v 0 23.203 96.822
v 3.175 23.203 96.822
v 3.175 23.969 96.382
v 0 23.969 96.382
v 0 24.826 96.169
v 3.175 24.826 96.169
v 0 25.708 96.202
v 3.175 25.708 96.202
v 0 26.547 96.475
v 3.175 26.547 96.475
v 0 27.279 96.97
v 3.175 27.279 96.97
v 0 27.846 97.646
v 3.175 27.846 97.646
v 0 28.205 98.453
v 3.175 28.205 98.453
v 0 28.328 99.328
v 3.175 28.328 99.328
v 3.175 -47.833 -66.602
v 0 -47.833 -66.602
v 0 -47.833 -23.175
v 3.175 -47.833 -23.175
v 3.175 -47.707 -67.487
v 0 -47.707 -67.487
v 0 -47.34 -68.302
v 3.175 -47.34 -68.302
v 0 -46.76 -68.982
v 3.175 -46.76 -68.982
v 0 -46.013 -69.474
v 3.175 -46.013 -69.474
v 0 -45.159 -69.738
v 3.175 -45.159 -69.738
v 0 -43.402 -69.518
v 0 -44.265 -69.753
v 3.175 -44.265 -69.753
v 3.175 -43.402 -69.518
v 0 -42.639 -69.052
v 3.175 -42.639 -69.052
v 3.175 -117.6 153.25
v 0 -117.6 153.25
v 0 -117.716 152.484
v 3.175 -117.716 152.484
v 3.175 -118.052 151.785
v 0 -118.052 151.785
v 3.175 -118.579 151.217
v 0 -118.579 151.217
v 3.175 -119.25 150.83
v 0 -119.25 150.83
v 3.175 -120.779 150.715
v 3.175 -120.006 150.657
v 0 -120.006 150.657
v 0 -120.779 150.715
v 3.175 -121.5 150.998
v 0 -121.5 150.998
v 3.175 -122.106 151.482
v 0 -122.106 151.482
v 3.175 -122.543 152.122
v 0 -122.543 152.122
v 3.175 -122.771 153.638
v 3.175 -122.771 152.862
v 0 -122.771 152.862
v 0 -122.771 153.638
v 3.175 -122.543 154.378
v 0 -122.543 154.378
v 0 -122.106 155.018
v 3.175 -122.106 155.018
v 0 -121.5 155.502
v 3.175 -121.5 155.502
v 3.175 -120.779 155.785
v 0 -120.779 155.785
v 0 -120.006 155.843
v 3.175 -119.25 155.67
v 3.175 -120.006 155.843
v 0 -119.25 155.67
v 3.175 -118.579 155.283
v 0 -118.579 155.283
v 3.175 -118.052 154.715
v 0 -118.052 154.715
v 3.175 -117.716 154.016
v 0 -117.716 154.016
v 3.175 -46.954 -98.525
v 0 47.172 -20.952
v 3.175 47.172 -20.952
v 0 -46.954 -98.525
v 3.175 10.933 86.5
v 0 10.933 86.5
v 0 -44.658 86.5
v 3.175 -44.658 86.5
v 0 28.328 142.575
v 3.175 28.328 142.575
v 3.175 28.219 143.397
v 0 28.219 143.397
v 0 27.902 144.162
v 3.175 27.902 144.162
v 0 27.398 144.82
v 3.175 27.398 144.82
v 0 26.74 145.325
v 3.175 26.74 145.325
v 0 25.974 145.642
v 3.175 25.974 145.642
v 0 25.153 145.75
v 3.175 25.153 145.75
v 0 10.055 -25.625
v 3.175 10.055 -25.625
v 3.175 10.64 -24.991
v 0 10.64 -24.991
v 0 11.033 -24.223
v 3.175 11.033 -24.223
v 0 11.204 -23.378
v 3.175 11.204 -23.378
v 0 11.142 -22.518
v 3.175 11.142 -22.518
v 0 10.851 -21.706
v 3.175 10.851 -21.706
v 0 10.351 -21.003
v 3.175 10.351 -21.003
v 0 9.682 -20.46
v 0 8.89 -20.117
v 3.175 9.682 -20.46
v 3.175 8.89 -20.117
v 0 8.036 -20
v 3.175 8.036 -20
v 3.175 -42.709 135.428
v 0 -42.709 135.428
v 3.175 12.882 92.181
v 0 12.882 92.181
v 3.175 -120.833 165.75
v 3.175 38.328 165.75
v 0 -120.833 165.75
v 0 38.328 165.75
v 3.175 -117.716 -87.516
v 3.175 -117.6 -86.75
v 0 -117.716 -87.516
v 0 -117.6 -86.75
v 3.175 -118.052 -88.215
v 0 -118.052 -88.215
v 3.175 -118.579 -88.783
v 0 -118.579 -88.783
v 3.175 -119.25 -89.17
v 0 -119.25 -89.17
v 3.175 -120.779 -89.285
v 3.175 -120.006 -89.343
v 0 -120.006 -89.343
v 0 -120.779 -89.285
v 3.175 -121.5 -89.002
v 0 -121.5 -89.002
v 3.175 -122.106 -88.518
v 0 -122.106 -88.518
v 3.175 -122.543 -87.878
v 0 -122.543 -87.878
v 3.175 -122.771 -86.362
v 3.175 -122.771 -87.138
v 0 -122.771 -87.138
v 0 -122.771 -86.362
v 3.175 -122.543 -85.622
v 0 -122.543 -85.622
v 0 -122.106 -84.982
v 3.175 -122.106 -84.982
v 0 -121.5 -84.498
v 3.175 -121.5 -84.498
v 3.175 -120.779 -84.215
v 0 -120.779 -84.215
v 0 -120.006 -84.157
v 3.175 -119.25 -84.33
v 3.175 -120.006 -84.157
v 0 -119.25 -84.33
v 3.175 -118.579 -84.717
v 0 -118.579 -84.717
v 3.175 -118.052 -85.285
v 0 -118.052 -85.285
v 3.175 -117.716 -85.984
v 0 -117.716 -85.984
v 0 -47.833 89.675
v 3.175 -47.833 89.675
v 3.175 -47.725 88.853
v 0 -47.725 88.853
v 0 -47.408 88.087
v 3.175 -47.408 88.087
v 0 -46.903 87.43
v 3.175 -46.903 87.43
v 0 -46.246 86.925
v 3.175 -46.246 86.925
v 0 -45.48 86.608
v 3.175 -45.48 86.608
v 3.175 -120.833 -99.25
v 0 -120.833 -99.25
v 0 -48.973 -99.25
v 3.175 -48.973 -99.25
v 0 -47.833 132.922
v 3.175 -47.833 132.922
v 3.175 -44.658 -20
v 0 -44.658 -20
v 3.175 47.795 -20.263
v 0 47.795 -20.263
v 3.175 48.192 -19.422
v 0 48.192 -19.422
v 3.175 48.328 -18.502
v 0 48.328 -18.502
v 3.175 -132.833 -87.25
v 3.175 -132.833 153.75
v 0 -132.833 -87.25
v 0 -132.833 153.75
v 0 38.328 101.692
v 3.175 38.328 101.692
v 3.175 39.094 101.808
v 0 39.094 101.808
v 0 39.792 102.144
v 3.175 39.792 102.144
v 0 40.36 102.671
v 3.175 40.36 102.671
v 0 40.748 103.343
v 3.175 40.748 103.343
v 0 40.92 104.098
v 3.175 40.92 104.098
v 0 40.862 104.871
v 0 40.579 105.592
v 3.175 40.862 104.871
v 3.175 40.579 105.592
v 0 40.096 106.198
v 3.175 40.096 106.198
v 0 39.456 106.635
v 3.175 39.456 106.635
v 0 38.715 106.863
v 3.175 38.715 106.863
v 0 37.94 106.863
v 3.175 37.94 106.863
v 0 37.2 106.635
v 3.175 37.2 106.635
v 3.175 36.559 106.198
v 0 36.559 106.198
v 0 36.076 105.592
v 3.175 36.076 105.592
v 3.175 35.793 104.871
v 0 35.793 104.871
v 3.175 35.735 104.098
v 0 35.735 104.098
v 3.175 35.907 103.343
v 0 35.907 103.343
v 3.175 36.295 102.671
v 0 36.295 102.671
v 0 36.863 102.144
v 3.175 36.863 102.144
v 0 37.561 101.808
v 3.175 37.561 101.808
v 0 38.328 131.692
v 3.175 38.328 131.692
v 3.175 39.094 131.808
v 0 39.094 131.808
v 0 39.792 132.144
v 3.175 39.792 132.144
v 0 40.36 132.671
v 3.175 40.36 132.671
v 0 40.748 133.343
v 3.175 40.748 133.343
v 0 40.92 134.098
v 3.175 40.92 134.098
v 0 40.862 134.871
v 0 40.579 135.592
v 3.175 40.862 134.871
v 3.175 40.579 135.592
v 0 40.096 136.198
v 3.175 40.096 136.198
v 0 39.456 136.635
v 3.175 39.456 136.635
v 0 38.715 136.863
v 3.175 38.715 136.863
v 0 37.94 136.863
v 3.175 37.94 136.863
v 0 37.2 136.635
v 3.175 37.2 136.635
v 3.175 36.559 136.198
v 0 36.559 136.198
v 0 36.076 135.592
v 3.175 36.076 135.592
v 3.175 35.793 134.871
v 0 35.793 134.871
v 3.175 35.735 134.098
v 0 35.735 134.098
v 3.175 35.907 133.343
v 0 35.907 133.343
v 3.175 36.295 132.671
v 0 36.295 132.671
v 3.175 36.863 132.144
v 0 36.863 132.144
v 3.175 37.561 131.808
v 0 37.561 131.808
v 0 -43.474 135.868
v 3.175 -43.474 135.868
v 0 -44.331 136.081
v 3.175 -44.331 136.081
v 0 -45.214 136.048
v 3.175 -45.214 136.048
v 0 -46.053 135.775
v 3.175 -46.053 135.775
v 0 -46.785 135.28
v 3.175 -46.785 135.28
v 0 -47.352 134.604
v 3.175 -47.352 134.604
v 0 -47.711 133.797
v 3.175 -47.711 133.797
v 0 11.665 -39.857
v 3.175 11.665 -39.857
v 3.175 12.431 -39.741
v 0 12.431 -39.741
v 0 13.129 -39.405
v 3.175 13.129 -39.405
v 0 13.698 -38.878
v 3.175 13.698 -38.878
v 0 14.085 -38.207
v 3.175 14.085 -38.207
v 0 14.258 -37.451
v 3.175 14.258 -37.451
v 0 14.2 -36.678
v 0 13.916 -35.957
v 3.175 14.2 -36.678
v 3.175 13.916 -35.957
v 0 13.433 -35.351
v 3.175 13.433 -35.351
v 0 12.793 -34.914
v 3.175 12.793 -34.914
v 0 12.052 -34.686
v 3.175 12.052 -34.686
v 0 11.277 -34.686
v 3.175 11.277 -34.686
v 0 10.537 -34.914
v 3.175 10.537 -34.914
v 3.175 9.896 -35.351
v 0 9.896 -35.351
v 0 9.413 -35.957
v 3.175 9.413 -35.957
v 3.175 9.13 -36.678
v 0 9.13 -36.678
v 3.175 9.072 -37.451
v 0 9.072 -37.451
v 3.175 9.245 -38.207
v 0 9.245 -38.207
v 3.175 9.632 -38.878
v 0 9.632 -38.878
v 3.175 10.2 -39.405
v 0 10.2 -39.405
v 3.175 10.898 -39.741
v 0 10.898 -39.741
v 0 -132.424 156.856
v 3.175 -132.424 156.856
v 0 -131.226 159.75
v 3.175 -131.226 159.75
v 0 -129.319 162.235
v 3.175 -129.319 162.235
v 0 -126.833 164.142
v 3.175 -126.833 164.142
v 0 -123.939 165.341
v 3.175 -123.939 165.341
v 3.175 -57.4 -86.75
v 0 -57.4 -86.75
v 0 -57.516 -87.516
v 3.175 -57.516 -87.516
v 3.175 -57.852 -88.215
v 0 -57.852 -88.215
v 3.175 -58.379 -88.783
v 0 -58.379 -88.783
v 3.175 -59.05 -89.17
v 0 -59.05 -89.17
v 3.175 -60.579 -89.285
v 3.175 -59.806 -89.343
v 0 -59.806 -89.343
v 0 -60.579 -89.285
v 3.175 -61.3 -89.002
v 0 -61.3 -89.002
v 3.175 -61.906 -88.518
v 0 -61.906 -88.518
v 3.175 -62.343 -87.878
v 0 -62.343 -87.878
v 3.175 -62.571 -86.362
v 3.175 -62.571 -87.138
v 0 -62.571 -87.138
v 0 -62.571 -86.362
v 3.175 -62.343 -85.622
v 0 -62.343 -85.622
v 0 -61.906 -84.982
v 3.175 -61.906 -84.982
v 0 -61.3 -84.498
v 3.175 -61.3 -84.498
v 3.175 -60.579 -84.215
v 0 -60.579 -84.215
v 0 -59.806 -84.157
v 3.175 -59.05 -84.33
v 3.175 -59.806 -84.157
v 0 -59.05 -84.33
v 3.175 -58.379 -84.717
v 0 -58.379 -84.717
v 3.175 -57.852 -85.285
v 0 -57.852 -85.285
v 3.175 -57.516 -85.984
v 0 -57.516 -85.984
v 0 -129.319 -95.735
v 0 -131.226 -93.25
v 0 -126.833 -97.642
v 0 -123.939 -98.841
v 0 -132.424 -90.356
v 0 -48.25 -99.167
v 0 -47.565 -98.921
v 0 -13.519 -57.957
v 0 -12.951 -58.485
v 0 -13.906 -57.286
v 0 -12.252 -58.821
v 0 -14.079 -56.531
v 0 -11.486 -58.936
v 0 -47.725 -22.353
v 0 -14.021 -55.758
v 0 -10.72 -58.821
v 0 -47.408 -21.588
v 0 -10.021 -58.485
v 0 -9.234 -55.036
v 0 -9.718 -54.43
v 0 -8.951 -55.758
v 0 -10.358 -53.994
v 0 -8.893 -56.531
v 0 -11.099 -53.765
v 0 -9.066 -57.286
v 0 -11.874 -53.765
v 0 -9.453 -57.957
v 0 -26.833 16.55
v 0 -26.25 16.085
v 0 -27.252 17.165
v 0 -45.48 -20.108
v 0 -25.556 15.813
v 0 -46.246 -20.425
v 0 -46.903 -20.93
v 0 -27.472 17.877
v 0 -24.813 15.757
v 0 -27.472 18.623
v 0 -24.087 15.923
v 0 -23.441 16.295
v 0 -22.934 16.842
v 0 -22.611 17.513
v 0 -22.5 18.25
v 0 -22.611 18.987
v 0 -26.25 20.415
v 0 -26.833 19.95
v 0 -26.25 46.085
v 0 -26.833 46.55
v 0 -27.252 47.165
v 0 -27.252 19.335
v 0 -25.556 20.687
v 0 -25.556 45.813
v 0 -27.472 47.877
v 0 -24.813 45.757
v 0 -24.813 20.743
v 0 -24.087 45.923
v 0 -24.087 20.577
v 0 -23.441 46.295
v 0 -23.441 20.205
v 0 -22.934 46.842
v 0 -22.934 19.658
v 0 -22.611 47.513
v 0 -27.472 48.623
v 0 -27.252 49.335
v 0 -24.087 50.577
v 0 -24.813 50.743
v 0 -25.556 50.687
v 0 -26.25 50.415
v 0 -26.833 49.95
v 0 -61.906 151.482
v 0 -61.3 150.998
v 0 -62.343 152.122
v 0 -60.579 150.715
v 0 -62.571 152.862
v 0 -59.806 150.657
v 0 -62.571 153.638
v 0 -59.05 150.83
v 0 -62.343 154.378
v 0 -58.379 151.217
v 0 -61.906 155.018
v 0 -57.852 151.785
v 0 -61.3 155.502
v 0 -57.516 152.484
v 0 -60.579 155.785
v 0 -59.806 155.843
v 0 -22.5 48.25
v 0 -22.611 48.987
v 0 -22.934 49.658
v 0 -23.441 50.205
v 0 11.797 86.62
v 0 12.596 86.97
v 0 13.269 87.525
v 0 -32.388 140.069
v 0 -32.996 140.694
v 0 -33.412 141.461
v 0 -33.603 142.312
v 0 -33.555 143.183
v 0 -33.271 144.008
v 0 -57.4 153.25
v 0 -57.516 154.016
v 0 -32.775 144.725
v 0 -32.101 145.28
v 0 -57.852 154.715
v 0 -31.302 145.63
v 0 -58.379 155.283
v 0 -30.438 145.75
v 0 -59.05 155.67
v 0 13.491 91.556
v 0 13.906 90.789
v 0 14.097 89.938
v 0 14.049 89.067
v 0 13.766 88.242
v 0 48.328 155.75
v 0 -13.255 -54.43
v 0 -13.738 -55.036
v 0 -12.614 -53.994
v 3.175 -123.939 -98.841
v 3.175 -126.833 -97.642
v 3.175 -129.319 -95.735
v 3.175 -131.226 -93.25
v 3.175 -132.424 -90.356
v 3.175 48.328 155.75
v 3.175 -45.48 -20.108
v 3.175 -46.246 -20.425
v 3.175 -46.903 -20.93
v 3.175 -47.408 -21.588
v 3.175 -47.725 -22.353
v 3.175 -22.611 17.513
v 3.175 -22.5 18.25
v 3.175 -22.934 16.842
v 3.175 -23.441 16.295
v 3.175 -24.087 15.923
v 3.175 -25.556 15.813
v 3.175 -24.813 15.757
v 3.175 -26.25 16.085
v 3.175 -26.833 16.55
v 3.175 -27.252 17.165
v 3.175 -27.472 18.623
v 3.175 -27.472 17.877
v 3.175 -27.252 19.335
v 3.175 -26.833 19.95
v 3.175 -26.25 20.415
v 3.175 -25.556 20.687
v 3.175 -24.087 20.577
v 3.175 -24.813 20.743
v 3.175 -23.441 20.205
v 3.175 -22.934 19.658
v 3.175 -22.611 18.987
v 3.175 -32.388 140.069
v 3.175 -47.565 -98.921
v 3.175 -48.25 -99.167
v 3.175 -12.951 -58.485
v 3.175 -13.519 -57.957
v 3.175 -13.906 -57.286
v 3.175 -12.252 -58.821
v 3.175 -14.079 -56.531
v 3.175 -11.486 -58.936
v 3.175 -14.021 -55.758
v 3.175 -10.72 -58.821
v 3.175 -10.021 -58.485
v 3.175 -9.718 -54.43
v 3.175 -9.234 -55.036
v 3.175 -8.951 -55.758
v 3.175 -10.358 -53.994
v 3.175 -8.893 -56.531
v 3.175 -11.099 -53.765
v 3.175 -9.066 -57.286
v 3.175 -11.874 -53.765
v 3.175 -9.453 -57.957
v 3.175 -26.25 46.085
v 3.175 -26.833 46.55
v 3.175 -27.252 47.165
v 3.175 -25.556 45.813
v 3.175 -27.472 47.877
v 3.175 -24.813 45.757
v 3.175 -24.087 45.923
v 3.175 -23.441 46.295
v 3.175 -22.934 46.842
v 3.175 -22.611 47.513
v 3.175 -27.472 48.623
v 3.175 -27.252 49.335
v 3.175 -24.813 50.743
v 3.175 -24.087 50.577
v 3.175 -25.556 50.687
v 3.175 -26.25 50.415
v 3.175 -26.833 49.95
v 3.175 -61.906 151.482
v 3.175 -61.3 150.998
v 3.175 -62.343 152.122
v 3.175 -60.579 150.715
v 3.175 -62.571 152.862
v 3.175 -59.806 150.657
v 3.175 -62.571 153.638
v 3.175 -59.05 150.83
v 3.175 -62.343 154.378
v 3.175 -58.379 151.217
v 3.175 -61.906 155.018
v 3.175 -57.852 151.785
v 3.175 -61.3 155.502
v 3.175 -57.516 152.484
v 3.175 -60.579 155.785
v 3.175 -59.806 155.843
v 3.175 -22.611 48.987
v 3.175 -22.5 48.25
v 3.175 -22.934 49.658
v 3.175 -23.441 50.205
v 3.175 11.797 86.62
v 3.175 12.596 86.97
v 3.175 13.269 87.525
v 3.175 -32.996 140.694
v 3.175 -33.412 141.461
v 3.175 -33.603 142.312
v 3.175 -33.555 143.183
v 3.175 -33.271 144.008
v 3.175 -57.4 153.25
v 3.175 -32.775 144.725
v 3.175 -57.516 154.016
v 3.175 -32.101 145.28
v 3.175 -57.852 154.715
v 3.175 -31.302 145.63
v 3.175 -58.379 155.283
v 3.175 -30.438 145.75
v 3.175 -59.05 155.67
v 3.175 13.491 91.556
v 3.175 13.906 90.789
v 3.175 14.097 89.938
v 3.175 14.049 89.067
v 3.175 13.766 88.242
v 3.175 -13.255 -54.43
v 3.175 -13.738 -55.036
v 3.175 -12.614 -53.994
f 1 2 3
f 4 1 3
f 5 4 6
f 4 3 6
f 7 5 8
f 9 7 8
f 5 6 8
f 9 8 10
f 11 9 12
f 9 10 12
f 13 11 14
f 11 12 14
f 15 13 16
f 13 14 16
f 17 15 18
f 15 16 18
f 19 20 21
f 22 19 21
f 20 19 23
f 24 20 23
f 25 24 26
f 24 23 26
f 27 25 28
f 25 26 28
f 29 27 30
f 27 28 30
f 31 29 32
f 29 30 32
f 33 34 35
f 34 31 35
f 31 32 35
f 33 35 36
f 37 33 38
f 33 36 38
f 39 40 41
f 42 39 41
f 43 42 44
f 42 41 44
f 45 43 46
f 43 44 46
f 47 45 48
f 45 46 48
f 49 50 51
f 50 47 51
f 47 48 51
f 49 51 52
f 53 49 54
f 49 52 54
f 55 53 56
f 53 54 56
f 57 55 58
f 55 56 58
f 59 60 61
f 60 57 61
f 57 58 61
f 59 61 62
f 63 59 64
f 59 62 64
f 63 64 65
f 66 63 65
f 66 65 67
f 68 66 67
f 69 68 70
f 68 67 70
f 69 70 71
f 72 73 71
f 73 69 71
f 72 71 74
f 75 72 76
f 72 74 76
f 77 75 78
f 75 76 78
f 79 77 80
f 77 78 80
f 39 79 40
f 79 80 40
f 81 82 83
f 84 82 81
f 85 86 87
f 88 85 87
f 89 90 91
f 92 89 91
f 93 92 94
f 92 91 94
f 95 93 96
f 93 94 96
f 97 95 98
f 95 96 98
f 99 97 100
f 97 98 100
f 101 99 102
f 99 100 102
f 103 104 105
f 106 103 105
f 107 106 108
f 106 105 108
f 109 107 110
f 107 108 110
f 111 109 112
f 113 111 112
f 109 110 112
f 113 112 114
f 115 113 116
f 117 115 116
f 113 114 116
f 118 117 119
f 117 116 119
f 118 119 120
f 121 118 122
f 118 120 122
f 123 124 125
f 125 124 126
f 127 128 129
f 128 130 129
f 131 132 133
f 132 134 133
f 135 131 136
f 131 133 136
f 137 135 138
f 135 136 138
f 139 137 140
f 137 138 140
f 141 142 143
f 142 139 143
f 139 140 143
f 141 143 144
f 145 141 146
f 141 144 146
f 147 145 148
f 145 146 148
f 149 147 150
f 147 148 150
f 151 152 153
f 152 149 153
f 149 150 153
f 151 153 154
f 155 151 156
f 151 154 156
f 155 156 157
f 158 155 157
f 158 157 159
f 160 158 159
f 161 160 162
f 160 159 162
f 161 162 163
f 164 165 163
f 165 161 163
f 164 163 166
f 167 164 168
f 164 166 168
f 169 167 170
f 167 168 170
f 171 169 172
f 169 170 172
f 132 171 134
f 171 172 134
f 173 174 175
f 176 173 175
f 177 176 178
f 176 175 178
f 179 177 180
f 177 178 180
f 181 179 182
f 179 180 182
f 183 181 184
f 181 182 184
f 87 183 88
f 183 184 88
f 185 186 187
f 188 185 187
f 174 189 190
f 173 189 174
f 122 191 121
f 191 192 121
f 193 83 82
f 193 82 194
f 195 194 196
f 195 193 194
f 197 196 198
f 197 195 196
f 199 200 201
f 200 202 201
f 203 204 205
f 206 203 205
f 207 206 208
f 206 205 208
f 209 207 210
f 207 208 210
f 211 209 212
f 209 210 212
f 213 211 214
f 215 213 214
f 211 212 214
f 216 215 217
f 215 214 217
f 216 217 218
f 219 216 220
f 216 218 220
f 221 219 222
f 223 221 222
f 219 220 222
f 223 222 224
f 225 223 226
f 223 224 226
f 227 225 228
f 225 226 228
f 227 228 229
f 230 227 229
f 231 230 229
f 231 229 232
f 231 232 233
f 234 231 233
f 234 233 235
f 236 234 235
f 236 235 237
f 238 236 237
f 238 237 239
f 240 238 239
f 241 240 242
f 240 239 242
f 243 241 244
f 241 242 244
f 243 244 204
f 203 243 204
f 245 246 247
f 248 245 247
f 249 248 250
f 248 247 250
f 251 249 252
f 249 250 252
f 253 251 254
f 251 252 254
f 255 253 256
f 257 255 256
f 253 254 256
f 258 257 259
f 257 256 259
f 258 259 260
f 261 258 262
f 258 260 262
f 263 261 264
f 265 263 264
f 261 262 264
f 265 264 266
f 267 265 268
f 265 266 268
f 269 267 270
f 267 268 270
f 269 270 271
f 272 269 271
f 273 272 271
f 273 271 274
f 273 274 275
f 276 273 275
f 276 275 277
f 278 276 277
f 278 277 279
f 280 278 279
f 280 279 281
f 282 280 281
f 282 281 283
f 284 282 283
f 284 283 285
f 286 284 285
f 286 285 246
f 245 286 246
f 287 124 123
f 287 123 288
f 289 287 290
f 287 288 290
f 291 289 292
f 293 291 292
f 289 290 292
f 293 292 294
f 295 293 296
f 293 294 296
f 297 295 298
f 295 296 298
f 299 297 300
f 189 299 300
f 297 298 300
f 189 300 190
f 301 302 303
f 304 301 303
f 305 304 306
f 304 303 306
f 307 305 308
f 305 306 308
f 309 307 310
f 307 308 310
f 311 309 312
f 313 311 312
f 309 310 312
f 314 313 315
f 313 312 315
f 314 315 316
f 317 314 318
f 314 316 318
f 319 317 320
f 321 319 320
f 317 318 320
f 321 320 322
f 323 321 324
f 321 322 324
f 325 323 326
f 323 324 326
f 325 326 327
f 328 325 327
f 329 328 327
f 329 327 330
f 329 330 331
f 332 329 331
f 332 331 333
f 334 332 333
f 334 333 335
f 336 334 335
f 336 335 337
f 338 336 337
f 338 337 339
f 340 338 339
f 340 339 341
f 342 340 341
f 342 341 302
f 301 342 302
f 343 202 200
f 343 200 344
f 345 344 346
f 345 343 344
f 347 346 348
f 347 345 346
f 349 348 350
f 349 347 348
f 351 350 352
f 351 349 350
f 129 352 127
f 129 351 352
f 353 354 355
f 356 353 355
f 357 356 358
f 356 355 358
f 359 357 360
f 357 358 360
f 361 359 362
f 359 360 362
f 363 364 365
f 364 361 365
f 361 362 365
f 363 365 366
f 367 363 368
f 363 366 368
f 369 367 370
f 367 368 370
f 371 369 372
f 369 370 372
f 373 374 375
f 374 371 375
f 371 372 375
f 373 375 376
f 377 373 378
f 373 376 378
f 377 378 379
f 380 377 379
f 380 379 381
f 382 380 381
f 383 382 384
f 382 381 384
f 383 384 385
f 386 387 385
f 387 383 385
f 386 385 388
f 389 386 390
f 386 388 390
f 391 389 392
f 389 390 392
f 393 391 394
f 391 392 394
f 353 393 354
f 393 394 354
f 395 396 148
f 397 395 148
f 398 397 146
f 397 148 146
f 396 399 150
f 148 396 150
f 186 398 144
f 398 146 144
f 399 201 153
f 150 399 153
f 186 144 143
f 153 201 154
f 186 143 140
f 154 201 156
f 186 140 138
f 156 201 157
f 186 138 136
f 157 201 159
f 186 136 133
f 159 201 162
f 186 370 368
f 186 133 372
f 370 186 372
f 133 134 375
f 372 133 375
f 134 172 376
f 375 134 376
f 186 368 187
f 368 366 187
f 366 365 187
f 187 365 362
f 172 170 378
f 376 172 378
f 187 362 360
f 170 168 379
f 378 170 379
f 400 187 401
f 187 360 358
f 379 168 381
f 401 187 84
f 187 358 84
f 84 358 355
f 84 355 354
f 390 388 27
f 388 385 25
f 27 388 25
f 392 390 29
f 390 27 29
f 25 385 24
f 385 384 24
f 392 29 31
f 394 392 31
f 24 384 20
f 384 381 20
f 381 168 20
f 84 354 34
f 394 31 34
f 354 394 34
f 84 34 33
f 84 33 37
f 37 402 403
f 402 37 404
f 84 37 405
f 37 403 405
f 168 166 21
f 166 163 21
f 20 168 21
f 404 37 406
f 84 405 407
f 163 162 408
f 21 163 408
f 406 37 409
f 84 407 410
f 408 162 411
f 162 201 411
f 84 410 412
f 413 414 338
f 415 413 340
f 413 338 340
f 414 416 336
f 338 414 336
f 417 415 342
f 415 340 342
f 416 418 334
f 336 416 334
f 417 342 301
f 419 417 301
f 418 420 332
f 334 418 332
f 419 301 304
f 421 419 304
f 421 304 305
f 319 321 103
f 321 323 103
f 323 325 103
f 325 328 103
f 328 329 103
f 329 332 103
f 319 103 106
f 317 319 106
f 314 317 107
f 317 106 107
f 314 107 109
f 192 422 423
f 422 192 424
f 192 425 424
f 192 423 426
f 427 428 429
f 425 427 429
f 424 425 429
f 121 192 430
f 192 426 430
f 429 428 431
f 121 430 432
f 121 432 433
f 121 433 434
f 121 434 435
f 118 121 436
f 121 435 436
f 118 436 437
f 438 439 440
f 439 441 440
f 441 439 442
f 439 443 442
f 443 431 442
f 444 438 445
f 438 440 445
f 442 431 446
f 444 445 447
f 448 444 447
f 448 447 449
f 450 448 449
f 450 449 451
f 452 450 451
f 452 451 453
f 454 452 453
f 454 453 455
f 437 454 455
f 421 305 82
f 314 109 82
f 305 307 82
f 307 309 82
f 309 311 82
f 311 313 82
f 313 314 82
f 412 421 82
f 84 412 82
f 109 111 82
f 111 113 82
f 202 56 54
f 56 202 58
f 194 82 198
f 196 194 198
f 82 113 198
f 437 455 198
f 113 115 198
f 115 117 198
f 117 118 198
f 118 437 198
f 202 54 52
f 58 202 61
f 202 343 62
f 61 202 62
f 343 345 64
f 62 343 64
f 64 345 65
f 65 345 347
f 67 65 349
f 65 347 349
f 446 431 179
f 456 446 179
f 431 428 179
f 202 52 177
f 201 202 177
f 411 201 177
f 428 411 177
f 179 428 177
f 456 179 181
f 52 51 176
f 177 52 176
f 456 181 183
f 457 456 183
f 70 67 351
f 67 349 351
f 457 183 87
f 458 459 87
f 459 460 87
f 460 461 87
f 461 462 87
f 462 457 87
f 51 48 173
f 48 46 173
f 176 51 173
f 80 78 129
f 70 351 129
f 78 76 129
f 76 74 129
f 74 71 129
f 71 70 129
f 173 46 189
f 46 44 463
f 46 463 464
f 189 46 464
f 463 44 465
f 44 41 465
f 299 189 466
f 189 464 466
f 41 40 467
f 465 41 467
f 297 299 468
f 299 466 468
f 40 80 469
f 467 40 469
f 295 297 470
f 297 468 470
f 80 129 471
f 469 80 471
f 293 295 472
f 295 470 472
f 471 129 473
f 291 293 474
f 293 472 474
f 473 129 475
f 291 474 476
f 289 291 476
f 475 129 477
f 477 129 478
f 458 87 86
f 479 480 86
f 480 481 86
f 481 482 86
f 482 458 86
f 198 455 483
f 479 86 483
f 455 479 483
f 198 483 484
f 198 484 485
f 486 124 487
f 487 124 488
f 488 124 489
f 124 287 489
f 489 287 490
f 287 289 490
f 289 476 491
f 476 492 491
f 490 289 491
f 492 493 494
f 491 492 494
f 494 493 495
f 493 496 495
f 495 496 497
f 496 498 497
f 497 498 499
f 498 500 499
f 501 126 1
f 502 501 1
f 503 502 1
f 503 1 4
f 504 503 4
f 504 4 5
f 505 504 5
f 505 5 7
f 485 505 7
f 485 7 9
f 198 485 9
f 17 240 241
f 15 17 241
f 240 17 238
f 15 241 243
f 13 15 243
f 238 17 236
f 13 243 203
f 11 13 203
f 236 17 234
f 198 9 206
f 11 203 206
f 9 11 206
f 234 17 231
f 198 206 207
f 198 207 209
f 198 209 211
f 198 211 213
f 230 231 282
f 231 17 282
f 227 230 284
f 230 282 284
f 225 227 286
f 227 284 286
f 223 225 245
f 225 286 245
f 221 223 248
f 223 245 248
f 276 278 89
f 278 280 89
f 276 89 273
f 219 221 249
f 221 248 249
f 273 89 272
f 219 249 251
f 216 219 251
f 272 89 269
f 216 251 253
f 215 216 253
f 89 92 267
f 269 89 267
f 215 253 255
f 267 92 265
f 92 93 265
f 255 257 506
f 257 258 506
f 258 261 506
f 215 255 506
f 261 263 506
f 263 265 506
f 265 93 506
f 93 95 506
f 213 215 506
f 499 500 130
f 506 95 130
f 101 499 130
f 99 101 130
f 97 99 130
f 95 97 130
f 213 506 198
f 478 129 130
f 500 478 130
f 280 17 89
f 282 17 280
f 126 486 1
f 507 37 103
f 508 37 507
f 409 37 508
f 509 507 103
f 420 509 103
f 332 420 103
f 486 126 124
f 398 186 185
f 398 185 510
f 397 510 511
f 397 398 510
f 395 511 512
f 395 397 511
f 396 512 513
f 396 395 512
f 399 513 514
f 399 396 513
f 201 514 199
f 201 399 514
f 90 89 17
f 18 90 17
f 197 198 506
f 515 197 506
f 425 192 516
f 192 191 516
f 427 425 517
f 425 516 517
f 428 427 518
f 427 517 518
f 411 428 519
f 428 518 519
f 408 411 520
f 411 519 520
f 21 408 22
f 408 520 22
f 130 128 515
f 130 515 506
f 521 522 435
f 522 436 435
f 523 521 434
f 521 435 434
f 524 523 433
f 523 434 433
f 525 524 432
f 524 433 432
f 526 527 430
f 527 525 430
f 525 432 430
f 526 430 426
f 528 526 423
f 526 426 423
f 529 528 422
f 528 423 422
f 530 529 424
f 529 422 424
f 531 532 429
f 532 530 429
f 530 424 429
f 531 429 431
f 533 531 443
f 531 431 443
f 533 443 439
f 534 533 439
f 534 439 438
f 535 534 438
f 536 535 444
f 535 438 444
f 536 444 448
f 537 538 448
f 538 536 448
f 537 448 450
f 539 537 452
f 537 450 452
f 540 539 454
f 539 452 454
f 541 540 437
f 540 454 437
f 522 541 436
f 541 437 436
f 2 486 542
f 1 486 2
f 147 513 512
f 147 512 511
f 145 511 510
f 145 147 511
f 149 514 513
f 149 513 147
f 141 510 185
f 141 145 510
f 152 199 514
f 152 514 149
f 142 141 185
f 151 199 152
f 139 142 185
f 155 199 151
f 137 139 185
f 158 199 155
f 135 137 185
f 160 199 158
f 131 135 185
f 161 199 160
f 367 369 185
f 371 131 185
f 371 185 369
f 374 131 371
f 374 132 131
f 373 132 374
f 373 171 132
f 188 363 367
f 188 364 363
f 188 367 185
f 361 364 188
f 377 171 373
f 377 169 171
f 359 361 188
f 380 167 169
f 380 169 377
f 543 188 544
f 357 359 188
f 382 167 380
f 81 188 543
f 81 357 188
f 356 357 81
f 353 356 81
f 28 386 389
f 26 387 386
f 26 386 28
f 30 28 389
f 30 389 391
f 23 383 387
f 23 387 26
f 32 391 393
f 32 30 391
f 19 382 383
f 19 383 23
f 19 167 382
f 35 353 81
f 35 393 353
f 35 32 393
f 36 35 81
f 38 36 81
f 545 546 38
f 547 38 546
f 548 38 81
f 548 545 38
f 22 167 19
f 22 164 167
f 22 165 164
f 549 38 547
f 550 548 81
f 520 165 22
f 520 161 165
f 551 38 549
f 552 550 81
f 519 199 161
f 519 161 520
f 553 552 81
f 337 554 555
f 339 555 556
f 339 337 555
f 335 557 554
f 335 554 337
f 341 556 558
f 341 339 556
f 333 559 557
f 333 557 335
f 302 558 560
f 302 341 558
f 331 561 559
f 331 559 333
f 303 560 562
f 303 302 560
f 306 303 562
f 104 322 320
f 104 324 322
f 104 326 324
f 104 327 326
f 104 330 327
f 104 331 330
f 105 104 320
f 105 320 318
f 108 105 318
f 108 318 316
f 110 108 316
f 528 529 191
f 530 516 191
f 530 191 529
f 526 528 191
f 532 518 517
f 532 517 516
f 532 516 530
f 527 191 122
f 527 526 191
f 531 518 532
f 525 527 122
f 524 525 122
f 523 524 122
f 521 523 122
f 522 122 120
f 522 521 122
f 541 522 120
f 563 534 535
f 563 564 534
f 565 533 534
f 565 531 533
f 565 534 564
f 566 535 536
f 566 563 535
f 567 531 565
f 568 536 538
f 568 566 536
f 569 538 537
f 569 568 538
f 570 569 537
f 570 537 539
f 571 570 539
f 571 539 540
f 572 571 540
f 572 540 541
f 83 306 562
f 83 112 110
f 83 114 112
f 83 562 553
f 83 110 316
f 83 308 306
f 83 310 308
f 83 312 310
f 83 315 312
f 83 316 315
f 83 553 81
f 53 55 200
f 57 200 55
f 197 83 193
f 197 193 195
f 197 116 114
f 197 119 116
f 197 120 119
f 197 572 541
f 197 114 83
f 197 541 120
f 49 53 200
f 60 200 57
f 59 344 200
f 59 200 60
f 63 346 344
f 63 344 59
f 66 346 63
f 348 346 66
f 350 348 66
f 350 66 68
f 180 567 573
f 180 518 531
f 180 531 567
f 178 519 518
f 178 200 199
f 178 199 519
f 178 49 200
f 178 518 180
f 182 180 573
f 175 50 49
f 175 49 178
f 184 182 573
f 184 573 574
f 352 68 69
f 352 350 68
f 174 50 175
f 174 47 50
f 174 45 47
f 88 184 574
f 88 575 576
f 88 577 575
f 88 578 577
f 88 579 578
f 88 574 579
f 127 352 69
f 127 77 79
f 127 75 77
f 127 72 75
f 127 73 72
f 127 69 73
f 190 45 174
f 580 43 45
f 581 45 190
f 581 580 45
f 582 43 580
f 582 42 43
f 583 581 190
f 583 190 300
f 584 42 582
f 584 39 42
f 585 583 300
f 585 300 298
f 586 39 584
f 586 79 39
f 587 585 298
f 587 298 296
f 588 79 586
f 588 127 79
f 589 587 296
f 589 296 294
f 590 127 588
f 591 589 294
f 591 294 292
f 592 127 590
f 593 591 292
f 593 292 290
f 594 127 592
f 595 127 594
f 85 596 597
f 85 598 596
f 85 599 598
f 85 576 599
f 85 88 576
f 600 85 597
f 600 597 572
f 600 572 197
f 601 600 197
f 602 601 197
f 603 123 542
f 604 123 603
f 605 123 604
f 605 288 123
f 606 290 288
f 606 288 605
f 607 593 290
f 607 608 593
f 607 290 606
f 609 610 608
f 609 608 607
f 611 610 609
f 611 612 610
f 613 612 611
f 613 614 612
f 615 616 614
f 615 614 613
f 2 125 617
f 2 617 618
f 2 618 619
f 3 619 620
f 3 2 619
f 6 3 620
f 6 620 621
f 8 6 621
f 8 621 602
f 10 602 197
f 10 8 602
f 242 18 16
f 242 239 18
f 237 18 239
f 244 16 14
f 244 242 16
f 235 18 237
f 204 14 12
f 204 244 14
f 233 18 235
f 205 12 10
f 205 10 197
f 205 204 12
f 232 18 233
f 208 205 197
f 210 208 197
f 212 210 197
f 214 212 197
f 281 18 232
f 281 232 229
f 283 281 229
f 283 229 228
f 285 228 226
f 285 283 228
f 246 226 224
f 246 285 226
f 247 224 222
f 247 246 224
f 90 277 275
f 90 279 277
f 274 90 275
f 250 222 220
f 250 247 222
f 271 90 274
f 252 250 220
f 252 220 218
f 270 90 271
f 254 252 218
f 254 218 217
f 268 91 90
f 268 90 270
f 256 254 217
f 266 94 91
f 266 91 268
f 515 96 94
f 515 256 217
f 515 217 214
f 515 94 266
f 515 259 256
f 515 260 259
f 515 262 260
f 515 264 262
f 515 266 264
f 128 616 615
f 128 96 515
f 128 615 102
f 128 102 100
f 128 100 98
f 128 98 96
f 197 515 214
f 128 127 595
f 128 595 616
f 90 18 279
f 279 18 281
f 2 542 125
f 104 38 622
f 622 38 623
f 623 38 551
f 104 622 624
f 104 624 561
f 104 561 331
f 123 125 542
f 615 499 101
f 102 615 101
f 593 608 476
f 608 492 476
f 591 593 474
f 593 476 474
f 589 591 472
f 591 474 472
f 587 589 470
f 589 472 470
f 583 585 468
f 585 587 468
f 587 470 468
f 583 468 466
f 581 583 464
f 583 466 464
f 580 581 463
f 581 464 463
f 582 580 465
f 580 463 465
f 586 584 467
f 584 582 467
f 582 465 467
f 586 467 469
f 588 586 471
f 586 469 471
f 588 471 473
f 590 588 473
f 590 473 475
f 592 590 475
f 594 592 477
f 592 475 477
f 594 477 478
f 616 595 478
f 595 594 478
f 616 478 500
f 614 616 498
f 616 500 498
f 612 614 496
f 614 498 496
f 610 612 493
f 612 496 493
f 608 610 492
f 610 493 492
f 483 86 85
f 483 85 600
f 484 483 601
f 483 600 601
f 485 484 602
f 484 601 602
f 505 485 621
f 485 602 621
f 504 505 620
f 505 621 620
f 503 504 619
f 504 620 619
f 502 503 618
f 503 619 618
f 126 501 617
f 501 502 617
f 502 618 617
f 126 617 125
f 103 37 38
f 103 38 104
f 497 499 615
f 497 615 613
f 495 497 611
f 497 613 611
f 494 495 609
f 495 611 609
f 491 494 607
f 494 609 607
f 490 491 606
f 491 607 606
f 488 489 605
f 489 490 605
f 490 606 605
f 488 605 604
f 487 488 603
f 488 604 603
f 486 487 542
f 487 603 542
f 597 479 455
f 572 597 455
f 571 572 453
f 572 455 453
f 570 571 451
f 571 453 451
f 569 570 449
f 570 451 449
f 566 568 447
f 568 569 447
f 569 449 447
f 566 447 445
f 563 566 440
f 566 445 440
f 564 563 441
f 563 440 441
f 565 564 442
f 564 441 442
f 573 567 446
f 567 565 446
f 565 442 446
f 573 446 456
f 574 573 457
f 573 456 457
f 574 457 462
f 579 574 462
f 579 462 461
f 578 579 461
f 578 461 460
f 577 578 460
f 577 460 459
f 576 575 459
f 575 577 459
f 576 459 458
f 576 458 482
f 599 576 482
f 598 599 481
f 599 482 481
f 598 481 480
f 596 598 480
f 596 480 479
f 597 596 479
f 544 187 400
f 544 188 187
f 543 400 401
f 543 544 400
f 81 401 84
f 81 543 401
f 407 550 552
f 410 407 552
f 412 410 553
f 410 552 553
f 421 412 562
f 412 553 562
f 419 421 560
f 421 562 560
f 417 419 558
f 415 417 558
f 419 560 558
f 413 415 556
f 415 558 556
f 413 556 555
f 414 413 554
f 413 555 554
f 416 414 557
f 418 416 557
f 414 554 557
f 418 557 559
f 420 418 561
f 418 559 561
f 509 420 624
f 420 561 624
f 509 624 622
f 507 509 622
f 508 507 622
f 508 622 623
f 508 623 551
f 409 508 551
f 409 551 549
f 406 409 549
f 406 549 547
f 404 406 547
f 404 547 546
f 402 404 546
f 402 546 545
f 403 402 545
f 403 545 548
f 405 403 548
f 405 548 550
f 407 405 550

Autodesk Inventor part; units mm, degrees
ref_plane "YZ Plane" through (0, 0, 0) normal (1, 0, 0) x (0, 1, 0)
ref_plane "XZ Plane" through (0, 0, 0) normal (0, 1, 0) x (-1, 0, 0)
ref_plane "XY Plane" through (0, 0, 0) normal (0, 0, 1) x (1, 0, 0)
sketch "Sketch1" plane through (0, 0, 0) normal (1, 0, 0) x (0, 1, 0)
  line L0 (0, 0) -> (40, 0) construction
  line L1 (40, 0) -> (40, 66.5) construction
  line L2 (40, 66.5) -> (0, 66.5) construction
  line L3 (0, 66.5) -> (0, 0) construction
  line L4 (0, 66.5) -> (40, 66.5) construction
  line L5 (40, 66.5) -> (40, 86.5) construction
  line L6 (40, 86.5) -> (0, 86.5)
  line L7 (0, 86.5) -> (0, 66.5) construction
  line L8 (0, 0) -> (40, 0) construction
  line L9 (40, 0) -> (40, -20) construction
  line L10 (40, -20) -> (0, -20) construction
  line L11 (0, -20) -> (0, 0) construction
  line L12 (48.2, 61.45) -> (-8.2, 61.45) construction
  line L13 (-8.2, 61.45) -> (-8.2, 5.05) construction
  line L14 (-8.2, 5.05) -> (48.2, 5.05) construction
  line L15 (48.2, 5.05) -> (48.2, 61.45) construction
  line L16 (48.2, 33.25) -> (-8.2, 33.25) construction
  line L17 (40, 33.25) -> (0, 33.25) construction
  line L18 (43.57, 56.82) -> (-3.57, 56.82) construction
  line L19 (-3.57, 56.82) -> (-3.57, 9.68) construction
  line L20 (-3.57, 9.68) -> (43.57, 9.68) construction
  line L21 (43.57, 9.68) -> (43.57, 56.82) construction
  line L22 (43.57, 56.82) -> (48.2, 56.82) construction
  line L23 (43.57, 56.82) -> (43.57, 61.45) construction
  line L24 (-3.57, 9.68) -> (-8.2, 9.68) construction
  line L25 (-3.57, 9.68) -> (-3.57, 5.05) construction
  line L26 (40, -10) -> (0, -10) construction
  line L27 (40, 76.5) -> (0, 76.5) construction
  circle A0 centre (30, 76.5) radius 2.1
  circle A1 centre (10, 76.5) radius 2.1
  circle A2 centre (30, -10) radius 2.1
  circle A3 centre (10, -10) radius 2.1
  circle A4 centre (43.57, 56.82) radius 2.6
  circle A5 centre (43.57, 9.68) radius 2.6
  circle A6 centre (-3.57, 9.68) radius 2.6
  circle A7 centre (-3.57, 56.82) radius 2.6
  circle A8 centre (20, 33.25) radius 19.15
  circle A9 centre (-25, 18.25) radius 11.08 construction
  circle A10 centre (-25, 18.25) radius 13 construction
  circle A11 centre (-25, 18.25) radius 2.5
  line L28 (-60, 153.25) -> (-60, -86.75) construction
  circle A12 centre (-60, -86.75) radius 2.6
  circle A13 centre (-60, 153.25) radius 2.6
  line L29 (-120.2, 153.25) -> (-120.2, -86.75) construction
  circle A14 centre (-120.2, -86.75) radius 2.6
  circle A15 centre (-120.2, 153.25) radius 2.6
  circle A16 centre (-60, -86.75) radius 12 construction
  circle A17 centre (-120.2, -86.75) radius 12 construction
  circle A18 centre (-120.2, 153.25) radius 12 construction
  circle A19 centre (-60, 153.25) radius 12 construction
  line L30 (-110, 482.7599) -> (-70, 482.7599) construction
  line L31 (-70, -517.2401) -> (-110, -517.2401) construction
  circle A20 centre (-25, 48.25) radius 2.5
  circle A21 centre (-25, 48.25) radius 11.08 construction
  circle A22 centre (-25, 48.25) radius 13 construction
  circle A23 centre (20, 33.25) radius 11.08 construction
  circle A24 centre (20, 33.25) radius 13 construction
  line L32 (-23.1873, 29.1807) -> (18.1873, 22.3193) construction
  line L33 (18.1873, 44.1807) -> (-23.1873, 37.3193) construction
  line L34 (-120.8333, -99.25) -> (-47.8333, -99.25)
  line L35 (-47.8333, 165.75) -> (-120.8333, 165.75)
  line L36 (-132.8333, 153.75) -> (-132.8333, -87.25)
  line L37 (-60, 153.25) -> (-120.2, 153.25) construction
  line L38 (-120.2, -86.75) -> (-60, -86.75) construction
  line L39 (-60, 153.25) -> (-60, 165.75) construction
  line L40 (-120.2, -86.75) -> (-120.2, -99.25) construction
  line L41 (48.3276, -20) -> (48.3276, 86.5)
  line L42 (17.6122, 86.5) -> (40, 86.5) construction
  arc A25 (-120.8333, 165.75) -> (-132.8333, 153.75) centre (-120.8333, 153.75) ccw
  arc A26 (-132.8333, -87.25) -> (-120.8333, -99.25) centre (-120.8333, -87.25) ccw
  line L43 (48.3276, -20) -> (-47.8333, -99.25)
  line L44 (-47.8333, 165.75) -> (-47.8333, -99.25) construction
  line L45 (-120.2, -86.75) -> (-132.8333, -86.75) construction
  line L46 (-60, 153.25) -> (-47.8333, 153.25) construction
  line L47 (-36.08, 48.25) -> (-36.08, 286.613) construction
  line L48 (-47.8333, 145.75) -> (-47.8333, 86.5)
  line L49 (-47.8333, 86.5) -> (16.8804, 86.5)
  line L50 (-47.8333, -73.3332) -> (16.8804, -20)
  line L51 (-47.8333, -20) -> (16.8804, -20)
  line L52 (-47.8333, -73.3332) -> (-47.8333, -20)
  line L53 (48.3276, 86.5) -> (48.3276, 165.75)
  line L54 (48.3276, 165.75) -> (-47.8333, 165.75)
  line L55 (-47.8333, 145.75) -> (28.3276, 145.75)
  line L56 (28.3276, 145.75) -> (28.3276, 86.5)
  line L57 (-47.8333, 145.75) -> (28.3276, 86.5) construction
  line L58 (-39.6904, 145.75) -> (28.3276, 92.8349)
  line L59 (-47.8333, 139.4151) -> (20.1847, 86.5)
  point P0 (-132.8333, -99.25)
  point P1 (-132.8333, 165.75)
  point P2 (-47.8333, 139.8332)
  point P3 (0, 86.5)
  point P4 (0, 86.5)
  dimension "d190" = 22.16
  dimension "d165" = 40
  dimension "d166" = 66.5
  dimension "d167" = 40
  dimension "d168" = 20
  dimension "d169" = 40
  dimension "d170" = 20
  dimension "d171" = 56.4
  dimension "d172" = 56.4
  dimension "d173" = 0
  dimension "d174" = 8.2
  dimension "d175" = 47.14
  dimension "d176" = 47.14
  dimension "d177" = 4.2
  dimension "d178" = 20
  dimension "d179" = 10
  dimension "d180" = 10
  dimension "d181" = 20
  dimension "d182" = 4.2
  dimension "d183" = 4.2
  dimension "d184" = 4.2
  dimension "d185" = 5.2
  dimension "d186" = 5.2
  dimension "d187" = 5.2
  dimension "d188" = 5.2
  dimension "d189" = 38.3
  dimension "d191" = 26
  dimension "d192" = 5
  dimension "d193" = 240
  dimension "d194" = 60
  dimension "d195" = 5.2
  dimension "d196" = 5.2
  dimension "d197" = 5.2
  dimension "d198" = 5.2
  dimension "d199" = 60.2
  dimension "d200" = 24
  dimension "d201" = 24
  dimension "d202" = 24
  dimension "d203" = 24
  dimension "d204" = 40
  dimension "d205" = 1000
  dimension "d206" = 45
  dimension "d207" = 5
  dimension "d208" = 22.16
  dimension "d209" = 26
  dimension "d210" = 45
  dimension "d211" = 22.16
  dimension "d212" = 26
  dimension "d213" = 15
  dimension "d214" = 15
  dimension "d215" = 265
  dimension "d216" = 85
  dimension "d217" = 106.5
  dimension "d218" = 12
  dimension "d219" = 72.8333
  dimension "d220" = 28.3276
  dimension "d221" = 53.25
  dimension "d222" = 85
  dimension "d223" = 132.5
  dimension "d224" = 60.2
  dimension "d225" = 20
  dimension "d226" = 20
  dimension "d227" = 5
  dimension "d228" = 5
extrude "Extrusion1" add sketch "Sketch1" along normal blind 3.175 contours L6 L59 L48 L55 L58 L56 | A0 | A1 | A2 | A3 | A4 | A5 | A6 | A7 | A8 | A26 L36 A25 L35 L54 L53 L41 L43 L34
sketch "Sketch6" plane through (3.175, 0, 0) normal (1, 0, 0) x (0, 0, -1)
  line L0 (20, 16.8804) -> (73.3332, -47.8333)
  line L1 (20, 16.8804) -> (73.3332, -47.8333)
  line L2 (39.0796, -6.2705) -> (54.5136, 6.4492) construction
  line L3 (99.25, -47.8333) -> (20, 48.3276)
  circle A0 centre (37.2568, 11.6648) radius 2.6
  circle A1 centre (56.3364, -11.4861) radius 2.6
  line L4 (37.2568, 11.6648) -> (46.7966, 0.0893) construction
  line L5 (56.3364, -11.4861) -> (46.7966, 0.0893) construction
  line L6 (-145.75, 28.3276) -> (-92.8349, 28.3276)
  line L7 (-119.2924, 28.3276) -> (-119.2924, 48.3276) construction
  line L8 (20, 48.3276) -> (-165.75, 48.3276) construction
  circle A2 centre (-104.2924, 38.3276) radius 2.6
  circle A3 centre (-134.2924, 38.3276) radius 2.6
  line L9 (-104.2924, 38.3276) -> (-119.2924, 38.3276) construction
  line L10 (-134.2924, 38.3276) -> (-119.2924, 38.3276) construction
  point P0 (0, 0)
  dimension "d229" = 5.2
  dimension "d230" = 5.2
  dimension "d231" = 15
  dimension "d232" = 15
  dimension "d233" = 30
  dimension "d234" = 5.2
  dimension "d235" = 5.2
  dimension "d236" = 15
  dimension "d237" = 15
extrude "Extrusion6" cut sketch "Sketch6" against normal through all
fillet "Fillet2" radius 3.175 11 edges at (1.5875, 28.3276, 92.8349) (1.5875, 20.1847, 86.5) (1.5875, 28.3276, 145.75) (1.5875, -39.6904, 145.75) (1.5875, -47.8333, 139.4151) (1.5875, -47.8333, 86.5) (1.5875, 48.3276, -20) (1.5875, 16.8804, -20) (1.5875, -47.8333, -20) (1.5875, -47.8333, -73.3332) (1.5875, -47.8333, -99.25)
chamfer "Chamfer1" distance 10 angle 45 1 edges at (1.5875, 48.3276, 165.75)
properties part number "X Axis Belt V Wheel LEFT Outside Frame Machined No Logo"
